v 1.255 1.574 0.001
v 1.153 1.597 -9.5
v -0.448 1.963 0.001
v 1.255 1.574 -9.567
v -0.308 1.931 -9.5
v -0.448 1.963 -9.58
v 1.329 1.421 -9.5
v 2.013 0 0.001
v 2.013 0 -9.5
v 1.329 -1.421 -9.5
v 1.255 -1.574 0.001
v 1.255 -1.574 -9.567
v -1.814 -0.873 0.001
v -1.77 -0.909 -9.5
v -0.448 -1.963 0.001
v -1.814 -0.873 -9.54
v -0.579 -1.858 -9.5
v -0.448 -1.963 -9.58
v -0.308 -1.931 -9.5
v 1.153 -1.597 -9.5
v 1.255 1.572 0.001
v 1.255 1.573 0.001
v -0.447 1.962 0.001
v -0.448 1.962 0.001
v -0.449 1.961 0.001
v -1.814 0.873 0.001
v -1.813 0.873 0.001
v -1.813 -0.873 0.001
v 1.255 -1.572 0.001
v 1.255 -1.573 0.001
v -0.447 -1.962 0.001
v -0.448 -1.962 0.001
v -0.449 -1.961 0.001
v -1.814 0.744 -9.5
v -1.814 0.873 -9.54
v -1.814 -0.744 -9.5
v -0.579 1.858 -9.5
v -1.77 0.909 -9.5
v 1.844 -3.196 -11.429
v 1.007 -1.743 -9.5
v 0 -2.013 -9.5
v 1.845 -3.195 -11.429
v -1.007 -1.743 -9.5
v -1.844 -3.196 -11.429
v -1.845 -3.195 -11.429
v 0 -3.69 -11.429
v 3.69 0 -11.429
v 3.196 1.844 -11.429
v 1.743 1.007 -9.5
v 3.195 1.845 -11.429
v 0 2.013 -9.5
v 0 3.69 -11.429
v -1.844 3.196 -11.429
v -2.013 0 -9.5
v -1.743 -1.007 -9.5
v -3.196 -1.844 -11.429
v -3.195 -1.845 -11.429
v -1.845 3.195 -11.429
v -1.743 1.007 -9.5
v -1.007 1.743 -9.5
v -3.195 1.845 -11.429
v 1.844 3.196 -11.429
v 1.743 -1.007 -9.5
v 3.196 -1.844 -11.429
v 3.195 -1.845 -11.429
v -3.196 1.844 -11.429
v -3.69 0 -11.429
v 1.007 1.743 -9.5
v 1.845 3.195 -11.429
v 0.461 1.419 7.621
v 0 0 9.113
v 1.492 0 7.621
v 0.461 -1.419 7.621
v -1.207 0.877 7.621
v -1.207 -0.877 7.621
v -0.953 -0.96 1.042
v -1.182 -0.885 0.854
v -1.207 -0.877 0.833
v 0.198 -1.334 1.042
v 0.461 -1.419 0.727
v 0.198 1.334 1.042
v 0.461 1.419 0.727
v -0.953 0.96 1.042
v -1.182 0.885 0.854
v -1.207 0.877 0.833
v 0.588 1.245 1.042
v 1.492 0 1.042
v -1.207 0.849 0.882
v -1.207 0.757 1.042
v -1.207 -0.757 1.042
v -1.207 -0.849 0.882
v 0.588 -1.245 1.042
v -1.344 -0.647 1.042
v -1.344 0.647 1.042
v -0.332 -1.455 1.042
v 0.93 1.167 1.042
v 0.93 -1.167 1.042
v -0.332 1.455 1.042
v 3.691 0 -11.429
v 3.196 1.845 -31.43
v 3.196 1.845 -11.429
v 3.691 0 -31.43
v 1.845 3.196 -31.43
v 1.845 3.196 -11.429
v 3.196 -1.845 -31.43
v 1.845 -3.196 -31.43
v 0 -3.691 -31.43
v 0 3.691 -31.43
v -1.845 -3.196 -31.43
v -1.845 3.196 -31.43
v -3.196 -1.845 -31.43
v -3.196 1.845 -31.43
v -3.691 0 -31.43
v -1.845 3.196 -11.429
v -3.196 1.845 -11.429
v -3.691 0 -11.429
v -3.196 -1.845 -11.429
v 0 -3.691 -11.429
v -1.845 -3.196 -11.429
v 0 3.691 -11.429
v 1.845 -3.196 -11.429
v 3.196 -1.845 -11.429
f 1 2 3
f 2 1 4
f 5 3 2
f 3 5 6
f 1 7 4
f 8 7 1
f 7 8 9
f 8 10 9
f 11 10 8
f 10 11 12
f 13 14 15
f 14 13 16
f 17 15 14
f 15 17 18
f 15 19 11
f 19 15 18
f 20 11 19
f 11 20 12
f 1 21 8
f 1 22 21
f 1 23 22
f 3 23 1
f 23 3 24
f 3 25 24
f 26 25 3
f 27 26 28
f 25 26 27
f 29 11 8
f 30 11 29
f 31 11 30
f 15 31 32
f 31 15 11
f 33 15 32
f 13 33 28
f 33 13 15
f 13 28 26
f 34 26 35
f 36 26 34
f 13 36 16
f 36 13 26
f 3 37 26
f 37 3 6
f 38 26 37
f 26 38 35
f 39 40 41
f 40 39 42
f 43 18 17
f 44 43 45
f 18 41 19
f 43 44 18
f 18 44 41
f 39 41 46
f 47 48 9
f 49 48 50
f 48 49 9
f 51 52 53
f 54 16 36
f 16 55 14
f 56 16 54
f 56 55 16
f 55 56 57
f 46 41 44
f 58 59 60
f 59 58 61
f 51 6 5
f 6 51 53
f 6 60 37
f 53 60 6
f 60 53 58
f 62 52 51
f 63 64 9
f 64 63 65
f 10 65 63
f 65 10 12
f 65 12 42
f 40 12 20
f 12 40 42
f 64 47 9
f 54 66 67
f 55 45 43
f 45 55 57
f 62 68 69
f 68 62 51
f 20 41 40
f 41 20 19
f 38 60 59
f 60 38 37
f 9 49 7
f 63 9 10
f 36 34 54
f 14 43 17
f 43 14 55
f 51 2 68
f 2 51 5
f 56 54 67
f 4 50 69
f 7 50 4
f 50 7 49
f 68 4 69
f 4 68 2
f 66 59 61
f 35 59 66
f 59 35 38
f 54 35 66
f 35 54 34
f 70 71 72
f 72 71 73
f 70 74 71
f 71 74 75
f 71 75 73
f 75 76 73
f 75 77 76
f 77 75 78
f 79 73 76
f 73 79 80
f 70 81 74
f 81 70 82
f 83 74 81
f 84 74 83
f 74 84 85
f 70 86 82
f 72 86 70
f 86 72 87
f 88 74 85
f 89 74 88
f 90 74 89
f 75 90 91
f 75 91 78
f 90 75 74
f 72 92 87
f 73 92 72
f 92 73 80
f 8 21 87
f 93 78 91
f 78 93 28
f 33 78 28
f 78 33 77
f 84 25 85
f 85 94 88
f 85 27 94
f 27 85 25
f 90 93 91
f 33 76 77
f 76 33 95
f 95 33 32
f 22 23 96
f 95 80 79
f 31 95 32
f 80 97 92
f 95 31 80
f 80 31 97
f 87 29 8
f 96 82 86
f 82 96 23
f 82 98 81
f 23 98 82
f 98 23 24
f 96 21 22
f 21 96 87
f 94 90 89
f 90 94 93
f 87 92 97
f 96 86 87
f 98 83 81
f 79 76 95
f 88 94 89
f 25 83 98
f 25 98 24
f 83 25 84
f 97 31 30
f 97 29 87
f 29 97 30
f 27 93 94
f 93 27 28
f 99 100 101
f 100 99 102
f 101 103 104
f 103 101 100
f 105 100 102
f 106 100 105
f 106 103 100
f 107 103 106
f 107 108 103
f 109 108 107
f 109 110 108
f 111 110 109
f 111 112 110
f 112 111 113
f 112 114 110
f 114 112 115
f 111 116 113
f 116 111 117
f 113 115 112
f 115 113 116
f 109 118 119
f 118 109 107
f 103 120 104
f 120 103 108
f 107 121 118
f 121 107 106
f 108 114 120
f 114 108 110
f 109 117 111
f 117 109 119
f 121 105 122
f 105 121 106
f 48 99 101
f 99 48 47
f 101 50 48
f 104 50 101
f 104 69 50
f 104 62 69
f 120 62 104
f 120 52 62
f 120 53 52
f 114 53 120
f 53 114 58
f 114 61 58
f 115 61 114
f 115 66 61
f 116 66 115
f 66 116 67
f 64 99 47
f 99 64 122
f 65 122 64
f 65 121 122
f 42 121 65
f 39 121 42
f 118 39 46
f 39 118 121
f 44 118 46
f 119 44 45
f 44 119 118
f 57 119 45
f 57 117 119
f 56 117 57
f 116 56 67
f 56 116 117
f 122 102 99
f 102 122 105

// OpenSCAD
function dsink(dmaj) = dmaj*2.35-2.08;//
function hsink(dmaj,angle) = sin(90-angle/2)*((dsink(dmaj)-dmaj)/2/sin(angle/2));
function dmin(screw) = screw[0]-1.082532*screw[1];
function dp(screw) = screw[0]-0.649519*screw[1];
function dfree(screw) = screw[0]+0.649519*screw[1];
function dsinkfree(screw) = dsink(dfree(screw));
function hsinkfree(screw,angle) = hsink(dfree(screw),angle);
function num(n) =  n * 0.013 + 0.060;
function inch(i) = i*25.4;
function p(size,thread) =(thread=="extrafine"?pow(size,.5)/3.8:(thread=="fine"?pow(size,.6)/3.4:pow(size,.7)/3));

function profile(screw,screwlength,angle=82,headlength=2.54) = [
    screw[1],
    screw[0],
    dsinkfree(screw,angle,headlength),
    dsink(screw[0],angle,headlength),
    dfree(screw),
    dp(screw),
    dmin(screw),
    screwlength,
    hsink(screw[0],angle),
    hsinkfree(screw,angle)
];

function screw(size) = [size,p(size)];

function screwprofile(size,screwlength,angle=82,headlength=2.54) = profile(screw(size),screwlength,angle,headlength);

function inchprofile(size,screwlength,angle=82,headlength=2.54) = screwprofile(inch(size),screwlength,angle,headlength);

function numprofile(size,screwlength,angle=82,headlength=2.54) = inchprofile(num(size),screwlength,angle,headlength);

module screw(profile=numprofile(6,inch(.75)),depth=inch(.3),extralength=20,bitdia=0) {
        union() { //used to highlight screws without their extra hole length
            translate([0,0,depth+.001]) cylinder(d1=profile[5],d2=.001,h=profile[5]/2);
            cylinder(d=profile[5],h=depth+.001);
            cylinder(d1=profile[4],d2=profile[5],h=profile[4]-profile[5]);
        
            mirror([0,0,1]) {
                translate([0,0,-.001]) cylinder(d=profile[4],h=profile[7]-depth+.001);
                translate([0,0,profile[7]-profile[9]-depth]) cylinder(d2=profile[2],d1=profile[4],h=profile[9]);
                
                if (bitdia!=0) {
                    #translate([0,0,profile[7]-depth-0.001]) cylinder(d2=bitdia,d1=profile[2],h=(bitdia-profile[2]));
                }
                    
            }
        }
        if (bitdia==0) {
            mirror([0,0,1]) translate([0,0,profile[7]-depth-.001]) cylinder(d=profile[2],h=extralength+.001);
        } else {
            mirror([0,0,1]) translate([0,0,profile[7]-depth-.002+(bitdia-profile[2])]) cylinder(d=bitdia,h=extralength+.001);
        }
        
    
    
}

screw();
